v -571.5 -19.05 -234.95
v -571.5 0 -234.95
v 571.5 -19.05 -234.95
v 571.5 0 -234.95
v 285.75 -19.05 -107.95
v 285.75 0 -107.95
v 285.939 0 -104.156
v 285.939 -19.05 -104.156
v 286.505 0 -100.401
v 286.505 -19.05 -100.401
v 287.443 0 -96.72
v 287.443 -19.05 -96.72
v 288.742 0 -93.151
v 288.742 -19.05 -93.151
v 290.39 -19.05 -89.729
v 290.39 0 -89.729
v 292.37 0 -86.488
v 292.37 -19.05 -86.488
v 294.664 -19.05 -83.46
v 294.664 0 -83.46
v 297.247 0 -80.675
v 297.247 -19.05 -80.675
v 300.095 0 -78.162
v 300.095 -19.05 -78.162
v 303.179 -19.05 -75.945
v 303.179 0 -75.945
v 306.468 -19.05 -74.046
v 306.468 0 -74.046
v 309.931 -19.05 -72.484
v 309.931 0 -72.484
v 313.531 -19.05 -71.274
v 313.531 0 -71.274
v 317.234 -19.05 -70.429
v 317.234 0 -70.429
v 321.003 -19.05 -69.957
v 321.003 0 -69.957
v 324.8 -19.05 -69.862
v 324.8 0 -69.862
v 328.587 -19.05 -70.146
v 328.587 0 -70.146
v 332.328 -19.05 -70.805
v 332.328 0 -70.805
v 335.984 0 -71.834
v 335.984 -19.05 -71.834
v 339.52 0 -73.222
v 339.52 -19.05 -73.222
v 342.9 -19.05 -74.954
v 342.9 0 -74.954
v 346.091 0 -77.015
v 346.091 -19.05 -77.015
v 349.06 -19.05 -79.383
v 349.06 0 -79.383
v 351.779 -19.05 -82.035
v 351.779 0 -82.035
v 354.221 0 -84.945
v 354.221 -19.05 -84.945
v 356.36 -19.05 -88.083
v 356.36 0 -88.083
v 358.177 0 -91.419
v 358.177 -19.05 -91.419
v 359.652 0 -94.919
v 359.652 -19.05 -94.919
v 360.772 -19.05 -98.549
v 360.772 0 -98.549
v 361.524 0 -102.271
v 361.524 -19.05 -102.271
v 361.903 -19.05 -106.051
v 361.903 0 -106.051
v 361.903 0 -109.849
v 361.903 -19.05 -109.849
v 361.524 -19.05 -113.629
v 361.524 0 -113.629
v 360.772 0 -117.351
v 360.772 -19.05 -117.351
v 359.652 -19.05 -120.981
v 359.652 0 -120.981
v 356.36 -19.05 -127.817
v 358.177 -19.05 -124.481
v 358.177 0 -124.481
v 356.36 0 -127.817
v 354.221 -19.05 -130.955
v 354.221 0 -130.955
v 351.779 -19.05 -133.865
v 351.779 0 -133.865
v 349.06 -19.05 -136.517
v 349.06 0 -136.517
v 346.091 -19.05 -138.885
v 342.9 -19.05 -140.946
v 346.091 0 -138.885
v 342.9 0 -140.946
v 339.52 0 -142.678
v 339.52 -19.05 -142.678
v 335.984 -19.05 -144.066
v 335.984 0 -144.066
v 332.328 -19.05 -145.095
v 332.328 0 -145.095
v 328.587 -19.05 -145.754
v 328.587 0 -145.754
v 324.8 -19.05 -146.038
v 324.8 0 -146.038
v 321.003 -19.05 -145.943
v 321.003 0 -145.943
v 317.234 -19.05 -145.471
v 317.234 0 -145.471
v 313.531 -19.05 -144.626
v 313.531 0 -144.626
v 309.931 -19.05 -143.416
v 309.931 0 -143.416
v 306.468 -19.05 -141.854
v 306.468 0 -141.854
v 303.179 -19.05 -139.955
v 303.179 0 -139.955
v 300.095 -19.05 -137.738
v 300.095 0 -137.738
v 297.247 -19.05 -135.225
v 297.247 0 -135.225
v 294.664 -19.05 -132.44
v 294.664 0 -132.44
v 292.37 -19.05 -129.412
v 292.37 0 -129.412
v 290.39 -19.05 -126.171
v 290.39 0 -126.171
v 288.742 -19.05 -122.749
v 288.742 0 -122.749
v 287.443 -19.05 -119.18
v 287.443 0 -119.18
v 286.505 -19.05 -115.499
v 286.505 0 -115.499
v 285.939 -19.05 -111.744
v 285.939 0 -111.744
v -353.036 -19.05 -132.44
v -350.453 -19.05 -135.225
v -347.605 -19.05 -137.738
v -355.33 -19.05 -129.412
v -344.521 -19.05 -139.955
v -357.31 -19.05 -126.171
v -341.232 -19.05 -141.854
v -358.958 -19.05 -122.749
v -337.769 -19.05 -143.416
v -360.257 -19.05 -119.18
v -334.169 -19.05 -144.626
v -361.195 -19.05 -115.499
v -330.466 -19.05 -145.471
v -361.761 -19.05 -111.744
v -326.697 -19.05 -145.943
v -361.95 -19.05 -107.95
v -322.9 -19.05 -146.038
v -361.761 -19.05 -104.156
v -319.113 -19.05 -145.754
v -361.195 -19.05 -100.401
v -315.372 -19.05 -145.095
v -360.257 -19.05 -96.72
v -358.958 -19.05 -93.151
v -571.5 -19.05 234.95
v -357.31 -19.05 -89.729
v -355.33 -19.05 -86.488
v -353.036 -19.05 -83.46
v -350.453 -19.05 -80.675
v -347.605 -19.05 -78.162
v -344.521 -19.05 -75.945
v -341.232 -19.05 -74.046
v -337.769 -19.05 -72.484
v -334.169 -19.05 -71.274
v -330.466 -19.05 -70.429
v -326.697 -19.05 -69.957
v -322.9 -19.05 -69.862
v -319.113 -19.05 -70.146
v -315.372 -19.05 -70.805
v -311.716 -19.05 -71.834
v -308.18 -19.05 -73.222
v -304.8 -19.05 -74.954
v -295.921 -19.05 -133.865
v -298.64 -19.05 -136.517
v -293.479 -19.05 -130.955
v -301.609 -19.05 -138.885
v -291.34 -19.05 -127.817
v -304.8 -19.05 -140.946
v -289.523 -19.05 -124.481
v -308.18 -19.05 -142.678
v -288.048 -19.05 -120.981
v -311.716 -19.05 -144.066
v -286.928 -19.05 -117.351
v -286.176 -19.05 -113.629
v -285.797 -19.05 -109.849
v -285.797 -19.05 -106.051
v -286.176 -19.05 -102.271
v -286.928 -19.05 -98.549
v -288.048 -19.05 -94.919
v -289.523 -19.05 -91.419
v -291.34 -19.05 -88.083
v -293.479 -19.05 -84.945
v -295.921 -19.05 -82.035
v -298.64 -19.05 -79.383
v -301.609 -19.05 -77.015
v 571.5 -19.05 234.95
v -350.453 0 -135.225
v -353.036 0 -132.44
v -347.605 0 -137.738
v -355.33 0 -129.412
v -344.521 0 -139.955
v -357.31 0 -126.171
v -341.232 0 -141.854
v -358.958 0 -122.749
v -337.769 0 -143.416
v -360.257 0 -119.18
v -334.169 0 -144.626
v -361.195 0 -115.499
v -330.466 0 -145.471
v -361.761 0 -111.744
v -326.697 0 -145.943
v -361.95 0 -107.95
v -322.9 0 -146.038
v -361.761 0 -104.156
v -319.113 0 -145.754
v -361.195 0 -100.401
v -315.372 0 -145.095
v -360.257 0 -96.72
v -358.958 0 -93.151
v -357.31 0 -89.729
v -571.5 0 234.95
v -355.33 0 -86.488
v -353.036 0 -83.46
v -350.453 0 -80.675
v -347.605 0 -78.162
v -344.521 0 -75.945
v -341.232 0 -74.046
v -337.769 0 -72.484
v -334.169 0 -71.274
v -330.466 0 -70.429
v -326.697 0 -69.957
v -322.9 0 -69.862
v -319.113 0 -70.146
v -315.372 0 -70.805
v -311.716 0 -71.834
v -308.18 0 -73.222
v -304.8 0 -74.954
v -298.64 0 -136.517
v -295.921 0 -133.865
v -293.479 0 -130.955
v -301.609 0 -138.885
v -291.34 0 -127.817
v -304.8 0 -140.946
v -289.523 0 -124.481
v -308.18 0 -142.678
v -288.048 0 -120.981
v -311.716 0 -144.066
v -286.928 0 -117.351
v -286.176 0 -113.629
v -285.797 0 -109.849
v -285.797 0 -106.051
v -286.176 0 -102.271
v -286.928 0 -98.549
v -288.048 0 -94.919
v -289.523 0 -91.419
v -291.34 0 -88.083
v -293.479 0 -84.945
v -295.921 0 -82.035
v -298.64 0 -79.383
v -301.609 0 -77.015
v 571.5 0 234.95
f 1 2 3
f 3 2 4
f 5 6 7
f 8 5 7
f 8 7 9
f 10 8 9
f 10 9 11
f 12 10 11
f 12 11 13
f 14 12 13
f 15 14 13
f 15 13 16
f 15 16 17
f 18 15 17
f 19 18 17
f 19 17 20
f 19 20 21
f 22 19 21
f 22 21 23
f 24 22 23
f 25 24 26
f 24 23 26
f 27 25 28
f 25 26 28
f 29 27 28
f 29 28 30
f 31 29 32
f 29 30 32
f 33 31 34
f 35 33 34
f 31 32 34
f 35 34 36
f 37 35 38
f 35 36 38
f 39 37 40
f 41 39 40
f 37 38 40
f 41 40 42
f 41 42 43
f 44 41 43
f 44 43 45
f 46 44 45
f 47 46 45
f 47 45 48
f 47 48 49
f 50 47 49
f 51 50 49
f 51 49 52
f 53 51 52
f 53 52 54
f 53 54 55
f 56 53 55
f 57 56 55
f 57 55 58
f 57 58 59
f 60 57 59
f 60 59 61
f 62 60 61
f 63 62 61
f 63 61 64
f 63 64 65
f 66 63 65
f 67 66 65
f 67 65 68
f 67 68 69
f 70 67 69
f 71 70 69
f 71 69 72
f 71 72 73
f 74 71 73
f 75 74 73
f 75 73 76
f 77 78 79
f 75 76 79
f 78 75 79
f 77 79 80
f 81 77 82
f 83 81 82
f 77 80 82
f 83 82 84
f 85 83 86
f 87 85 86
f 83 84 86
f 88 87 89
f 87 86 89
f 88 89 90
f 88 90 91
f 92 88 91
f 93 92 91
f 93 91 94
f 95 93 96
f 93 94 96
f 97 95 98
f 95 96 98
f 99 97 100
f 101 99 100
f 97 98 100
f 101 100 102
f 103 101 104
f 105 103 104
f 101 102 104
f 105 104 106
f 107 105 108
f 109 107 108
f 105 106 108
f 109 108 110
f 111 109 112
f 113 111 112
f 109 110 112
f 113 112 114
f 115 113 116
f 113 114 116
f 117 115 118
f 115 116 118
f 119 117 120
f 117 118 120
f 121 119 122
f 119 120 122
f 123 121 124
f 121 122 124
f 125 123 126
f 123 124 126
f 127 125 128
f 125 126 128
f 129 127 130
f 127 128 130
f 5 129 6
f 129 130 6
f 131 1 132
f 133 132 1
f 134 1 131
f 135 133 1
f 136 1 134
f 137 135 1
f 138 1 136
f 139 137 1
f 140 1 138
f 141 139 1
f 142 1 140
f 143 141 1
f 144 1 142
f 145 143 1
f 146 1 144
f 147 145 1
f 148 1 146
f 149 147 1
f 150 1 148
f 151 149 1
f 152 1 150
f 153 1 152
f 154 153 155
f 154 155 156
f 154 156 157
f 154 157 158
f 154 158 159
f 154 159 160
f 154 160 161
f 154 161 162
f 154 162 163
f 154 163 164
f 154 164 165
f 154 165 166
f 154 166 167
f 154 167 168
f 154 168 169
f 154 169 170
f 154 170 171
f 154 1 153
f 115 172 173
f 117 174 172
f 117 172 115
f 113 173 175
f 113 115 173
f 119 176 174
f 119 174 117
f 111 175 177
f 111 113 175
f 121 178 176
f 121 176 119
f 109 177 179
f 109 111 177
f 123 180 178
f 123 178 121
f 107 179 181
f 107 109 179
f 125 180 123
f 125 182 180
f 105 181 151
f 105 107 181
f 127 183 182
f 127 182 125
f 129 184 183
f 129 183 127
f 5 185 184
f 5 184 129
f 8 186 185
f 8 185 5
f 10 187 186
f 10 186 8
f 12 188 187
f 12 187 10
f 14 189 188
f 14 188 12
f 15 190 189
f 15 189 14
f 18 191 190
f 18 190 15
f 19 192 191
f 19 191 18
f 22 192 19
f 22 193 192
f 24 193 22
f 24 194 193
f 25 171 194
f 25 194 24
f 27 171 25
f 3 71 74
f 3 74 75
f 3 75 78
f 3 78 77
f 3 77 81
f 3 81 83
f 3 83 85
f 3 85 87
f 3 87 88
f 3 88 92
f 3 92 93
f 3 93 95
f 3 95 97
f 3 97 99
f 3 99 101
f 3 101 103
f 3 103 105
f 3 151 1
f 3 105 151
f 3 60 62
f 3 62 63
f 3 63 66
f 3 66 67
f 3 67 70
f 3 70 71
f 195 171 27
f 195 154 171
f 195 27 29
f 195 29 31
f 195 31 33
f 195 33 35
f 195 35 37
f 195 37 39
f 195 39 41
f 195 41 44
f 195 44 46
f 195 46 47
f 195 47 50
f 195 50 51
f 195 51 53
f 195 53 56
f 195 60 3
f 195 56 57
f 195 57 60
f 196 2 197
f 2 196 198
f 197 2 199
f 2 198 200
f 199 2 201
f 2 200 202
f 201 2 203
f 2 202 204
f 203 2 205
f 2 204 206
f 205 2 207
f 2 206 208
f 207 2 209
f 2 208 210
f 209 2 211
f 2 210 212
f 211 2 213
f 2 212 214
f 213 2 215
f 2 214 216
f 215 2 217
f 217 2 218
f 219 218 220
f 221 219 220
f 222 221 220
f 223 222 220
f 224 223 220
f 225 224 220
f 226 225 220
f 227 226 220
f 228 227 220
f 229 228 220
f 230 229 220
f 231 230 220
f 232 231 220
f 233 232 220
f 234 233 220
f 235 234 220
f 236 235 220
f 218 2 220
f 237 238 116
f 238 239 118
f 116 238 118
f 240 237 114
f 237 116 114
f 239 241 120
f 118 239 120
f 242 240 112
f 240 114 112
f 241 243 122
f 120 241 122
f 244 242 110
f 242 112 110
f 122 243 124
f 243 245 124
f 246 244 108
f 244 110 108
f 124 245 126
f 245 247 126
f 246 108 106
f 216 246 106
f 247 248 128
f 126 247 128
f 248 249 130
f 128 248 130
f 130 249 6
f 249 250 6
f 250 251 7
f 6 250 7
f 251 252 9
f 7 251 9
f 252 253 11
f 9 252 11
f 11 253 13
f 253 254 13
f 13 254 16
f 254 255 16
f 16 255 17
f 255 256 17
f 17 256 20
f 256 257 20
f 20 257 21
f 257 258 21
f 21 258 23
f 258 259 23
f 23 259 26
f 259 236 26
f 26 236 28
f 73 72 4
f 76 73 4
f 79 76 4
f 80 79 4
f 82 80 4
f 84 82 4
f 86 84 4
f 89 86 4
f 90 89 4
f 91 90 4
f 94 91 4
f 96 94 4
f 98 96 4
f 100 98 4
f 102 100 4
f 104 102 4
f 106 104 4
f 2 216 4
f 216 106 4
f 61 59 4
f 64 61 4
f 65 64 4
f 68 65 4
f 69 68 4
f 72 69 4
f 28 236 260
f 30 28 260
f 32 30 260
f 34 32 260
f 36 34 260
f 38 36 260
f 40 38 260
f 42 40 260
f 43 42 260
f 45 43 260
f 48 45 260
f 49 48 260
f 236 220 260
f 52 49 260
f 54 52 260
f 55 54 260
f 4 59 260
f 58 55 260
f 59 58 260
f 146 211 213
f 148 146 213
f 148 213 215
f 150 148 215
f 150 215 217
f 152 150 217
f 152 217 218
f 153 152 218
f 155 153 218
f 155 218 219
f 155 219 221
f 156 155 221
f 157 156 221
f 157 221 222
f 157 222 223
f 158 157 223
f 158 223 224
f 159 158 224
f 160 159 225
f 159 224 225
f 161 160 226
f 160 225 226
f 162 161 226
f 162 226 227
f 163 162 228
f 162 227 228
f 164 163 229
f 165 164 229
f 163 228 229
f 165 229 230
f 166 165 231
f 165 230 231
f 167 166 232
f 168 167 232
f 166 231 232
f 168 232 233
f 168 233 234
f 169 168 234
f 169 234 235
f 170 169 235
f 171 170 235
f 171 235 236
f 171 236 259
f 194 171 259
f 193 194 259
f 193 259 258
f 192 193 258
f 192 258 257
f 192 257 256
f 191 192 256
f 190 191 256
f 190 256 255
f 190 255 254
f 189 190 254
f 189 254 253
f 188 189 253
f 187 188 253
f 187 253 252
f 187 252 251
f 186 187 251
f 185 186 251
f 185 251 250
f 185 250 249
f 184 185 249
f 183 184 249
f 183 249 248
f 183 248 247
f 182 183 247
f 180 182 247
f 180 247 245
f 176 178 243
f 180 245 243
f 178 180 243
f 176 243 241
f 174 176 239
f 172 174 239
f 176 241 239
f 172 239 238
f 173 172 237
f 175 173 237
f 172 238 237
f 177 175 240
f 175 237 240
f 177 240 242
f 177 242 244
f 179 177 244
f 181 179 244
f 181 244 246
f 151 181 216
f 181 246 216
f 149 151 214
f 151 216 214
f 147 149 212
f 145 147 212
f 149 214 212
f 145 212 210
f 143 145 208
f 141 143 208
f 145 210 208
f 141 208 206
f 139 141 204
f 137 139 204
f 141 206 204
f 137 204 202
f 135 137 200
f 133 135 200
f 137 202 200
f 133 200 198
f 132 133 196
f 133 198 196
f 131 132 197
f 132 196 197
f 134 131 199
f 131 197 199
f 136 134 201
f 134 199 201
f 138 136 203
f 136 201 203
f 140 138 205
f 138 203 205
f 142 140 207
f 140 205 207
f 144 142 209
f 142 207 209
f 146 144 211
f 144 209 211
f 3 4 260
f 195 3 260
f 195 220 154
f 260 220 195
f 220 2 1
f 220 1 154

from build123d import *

# Parameters (mm, degrees)
F0_W     = 1143
F0_H     = 469.9
F1_DEPTH = 19.05
F2_R     = 38.1
F3_DEPTH = 19.051


with BuildPart() as f1:
    # F0 (on Front) → F1 (new body)
    with BuildSketch(Plane.XZ):
        Rectangle(F0_W, F0_H)
    extrude(amount=F1_DEPTH)

    # F2 (on face) → F3 (cut, through all)
    with BuildSketch(Plane(origin=(0, 0, 0), x_dir=(-1, 0, 0), z_dir=(0, 1, 0))):
        with Locations((-323.85, -107.95)):
            Circle(F2_R)
        with Locations((323.85, -107.95)):
            Circle(F2_R)
    extrude(amount=-F3_DEPTH, mode=Mode.SUBTRACT)


solid = f1.part
